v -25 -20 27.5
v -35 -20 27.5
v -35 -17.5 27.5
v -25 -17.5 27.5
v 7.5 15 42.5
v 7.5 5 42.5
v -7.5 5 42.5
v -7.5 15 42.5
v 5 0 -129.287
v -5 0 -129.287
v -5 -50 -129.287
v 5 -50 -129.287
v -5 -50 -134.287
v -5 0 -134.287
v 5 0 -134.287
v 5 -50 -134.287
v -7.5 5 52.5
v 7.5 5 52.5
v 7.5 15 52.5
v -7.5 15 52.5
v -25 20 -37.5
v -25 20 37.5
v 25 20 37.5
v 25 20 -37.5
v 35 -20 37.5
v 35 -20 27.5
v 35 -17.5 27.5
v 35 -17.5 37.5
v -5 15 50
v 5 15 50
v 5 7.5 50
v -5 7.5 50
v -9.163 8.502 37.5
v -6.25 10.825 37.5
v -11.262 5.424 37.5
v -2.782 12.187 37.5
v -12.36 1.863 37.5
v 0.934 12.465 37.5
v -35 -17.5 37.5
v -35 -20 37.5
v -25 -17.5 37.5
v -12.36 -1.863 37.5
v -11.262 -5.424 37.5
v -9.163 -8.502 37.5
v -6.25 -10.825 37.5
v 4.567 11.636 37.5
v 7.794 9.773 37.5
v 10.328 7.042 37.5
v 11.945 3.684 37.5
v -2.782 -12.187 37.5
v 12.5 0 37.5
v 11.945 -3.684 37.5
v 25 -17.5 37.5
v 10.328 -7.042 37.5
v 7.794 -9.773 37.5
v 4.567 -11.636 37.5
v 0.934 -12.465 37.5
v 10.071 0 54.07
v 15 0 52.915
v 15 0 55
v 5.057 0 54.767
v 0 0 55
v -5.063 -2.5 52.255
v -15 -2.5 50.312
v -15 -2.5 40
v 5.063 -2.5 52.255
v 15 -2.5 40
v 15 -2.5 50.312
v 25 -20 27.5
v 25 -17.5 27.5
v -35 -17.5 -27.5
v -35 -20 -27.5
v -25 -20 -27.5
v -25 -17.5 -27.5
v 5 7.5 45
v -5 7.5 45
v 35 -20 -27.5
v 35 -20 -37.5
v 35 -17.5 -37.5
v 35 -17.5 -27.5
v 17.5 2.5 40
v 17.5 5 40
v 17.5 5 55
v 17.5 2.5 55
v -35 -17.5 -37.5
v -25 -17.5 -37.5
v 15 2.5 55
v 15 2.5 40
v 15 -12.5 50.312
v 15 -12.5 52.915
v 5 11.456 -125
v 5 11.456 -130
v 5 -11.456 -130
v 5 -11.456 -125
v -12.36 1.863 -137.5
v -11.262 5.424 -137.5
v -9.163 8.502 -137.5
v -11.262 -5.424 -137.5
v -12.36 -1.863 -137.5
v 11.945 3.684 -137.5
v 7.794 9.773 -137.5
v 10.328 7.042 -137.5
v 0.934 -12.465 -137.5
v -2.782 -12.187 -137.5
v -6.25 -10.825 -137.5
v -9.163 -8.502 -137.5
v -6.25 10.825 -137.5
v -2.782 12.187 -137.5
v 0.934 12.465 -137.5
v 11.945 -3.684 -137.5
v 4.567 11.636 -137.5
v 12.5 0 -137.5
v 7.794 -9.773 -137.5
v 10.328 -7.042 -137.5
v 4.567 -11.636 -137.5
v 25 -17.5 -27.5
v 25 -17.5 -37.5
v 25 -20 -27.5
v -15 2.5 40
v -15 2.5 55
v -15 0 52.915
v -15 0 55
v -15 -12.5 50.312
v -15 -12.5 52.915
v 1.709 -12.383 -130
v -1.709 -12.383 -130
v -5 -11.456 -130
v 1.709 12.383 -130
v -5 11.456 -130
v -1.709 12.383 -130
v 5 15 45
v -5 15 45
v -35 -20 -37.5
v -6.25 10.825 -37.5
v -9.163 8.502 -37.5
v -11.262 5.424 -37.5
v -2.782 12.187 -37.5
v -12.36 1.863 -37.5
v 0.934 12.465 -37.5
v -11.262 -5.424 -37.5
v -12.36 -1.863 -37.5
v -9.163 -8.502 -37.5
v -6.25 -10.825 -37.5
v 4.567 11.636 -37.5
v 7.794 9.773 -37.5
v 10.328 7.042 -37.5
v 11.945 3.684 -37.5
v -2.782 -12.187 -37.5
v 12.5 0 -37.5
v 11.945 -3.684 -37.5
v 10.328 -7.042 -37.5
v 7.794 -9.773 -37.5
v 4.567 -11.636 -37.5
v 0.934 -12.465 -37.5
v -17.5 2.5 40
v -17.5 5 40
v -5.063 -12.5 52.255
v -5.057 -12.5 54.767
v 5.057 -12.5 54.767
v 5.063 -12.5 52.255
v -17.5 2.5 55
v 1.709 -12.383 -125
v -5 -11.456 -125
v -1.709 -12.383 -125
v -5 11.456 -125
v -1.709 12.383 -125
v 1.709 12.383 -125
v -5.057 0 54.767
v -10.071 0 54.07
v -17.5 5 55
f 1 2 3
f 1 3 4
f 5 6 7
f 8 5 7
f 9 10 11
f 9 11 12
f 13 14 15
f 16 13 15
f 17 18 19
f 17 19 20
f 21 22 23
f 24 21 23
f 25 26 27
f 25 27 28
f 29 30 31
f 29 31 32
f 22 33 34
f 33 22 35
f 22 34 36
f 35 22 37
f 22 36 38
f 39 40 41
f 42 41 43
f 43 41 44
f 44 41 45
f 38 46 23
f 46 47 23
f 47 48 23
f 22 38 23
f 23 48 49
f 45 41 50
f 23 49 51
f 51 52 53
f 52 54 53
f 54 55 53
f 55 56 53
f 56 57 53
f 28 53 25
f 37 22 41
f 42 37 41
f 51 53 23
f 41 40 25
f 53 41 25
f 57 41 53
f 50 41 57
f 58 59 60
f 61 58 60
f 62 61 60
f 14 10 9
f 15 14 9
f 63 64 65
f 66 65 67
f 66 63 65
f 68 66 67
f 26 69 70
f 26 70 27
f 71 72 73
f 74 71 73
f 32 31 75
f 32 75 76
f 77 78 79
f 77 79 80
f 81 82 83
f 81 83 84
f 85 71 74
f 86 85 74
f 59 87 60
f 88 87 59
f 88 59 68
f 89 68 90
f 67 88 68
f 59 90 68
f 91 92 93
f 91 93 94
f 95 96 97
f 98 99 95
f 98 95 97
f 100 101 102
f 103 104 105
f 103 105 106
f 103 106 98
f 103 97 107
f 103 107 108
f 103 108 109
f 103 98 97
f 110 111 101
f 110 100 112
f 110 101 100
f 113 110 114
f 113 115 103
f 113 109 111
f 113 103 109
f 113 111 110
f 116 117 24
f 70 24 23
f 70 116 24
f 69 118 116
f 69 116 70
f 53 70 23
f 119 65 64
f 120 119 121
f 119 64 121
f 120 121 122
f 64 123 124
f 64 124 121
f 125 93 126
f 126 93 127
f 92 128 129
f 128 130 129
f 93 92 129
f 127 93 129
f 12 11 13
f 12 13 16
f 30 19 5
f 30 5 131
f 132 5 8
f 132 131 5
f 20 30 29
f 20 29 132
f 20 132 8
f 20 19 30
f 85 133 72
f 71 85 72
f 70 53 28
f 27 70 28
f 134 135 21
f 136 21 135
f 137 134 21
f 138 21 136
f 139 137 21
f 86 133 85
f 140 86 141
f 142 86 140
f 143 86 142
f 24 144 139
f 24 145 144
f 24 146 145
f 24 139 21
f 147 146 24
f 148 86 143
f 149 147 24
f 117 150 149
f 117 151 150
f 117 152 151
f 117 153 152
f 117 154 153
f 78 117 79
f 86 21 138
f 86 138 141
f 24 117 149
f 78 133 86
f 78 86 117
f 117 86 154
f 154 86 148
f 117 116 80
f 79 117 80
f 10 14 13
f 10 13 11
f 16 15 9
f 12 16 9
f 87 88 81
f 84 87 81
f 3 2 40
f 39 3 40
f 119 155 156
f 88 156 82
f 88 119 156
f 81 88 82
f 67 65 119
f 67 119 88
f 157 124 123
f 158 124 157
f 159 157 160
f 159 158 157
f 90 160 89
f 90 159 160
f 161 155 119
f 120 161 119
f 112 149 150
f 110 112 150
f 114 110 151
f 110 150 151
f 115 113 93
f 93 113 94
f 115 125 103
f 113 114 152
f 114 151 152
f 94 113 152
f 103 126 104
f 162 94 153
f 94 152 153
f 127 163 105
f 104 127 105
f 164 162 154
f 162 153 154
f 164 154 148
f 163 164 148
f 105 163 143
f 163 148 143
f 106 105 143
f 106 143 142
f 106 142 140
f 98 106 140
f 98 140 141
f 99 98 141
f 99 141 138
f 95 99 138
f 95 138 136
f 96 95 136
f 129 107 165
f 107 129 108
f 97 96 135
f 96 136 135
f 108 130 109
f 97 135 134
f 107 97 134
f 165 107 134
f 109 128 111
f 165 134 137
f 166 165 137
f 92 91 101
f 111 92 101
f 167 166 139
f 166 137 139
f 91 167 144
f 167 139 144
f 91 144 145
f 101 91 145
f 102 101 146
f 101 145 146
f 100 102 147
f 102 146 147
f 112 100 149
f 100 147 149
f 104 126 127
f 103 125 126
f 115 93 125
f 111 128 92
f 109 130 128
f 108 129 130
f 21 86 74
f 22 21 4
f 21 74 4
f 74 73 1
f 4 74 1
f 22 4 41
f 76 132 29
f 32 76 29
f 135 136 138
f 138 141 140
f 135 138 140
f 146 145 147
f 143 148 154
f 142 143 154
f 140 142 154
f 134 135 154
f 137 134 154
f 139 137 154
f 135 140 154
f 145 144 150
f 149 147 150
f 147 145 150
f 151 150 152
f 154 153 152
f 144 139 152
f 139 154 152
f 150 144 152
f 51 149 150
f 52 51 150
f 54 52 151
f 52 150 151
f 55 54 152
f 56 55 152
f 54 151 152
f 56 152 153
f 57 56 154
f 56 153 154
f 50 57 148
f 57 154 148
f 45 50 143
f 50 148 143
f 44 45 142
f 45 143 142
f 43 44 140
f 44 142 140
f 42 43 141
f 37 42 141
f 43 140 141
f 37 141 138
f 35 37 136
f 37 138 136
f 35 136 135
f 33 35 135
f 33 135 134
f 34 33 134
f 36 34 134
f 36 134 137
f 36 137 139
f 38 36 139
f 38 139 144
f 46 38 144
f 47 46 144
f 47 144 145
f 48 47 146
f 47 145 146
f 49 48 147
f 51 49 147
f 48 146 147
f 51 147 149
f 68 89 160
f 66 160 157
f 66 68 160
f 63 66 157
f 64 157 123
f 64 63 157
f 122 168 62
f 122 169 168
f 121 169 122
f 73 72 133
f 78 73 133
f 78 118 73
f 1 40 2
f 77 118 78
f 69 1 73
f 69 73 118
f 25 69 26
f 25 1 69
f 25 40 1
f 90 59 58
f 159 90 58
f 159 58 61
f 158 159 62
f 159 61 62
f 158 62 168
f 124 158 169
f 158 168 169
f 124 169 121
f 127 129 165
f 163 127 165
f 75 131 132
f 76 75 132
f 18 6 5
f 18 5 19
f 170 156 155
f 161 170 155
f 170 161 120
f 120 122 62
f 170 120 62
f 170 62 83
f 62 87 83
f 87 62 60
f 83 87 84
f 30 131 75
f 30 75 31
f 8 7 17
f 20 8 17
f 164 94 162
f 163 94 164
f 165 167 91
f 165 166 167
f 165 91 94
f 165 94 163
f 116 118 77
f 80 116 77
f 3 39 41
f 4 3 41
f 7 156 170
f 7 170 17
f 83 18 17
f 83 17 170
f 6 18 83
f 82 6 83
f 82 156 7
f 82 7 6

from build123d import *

# Parameters (mm, degrees)
F0_R      = 55
F1_DEPTH  = 12.5
F2_T      = -2.5
F4_DEPTH  = 25
F5_W      = 2.5
F5_H      = 2.5
F6_DEPTH  = 15
F7_W      = 15
F7_H      = 10
F8_DEPTH  = 10
F9_W      = 10
F9_H      = 5
F10_DEPTH = 7.5
F11_W     = 50
F11_H     = 75
F12_DEPTH = 20
F13_R     = 12.5
F14_DEPTH = 75
F15_W     = 10
F15_H     = 10
F16_DEPTH = 2.5
F18_DEPTH = 100
F17_W     = 10
F17_H     = 5
F19_DEPTH = 40
F20_W     = 10
F20_H     = 5
F21_DEPTH = 50


with BuildPart() as f1:
    # F0 (on Front) → F1 (new body)
    with BuildSketch(Plane.XZ):
        Circle(F0_R)
    extrude(amount=F1_DEPTH)

    # F2
    f2_openings = [f1.faces().sort_by_distance(p)[0] for p in [
        (0, -12.5, 0),
    ]]
    offset(amount=F2_T, openings=f2_openings)

    # F3 (on face) → F4 (cut)
    with BuildSketch(Plane.XZ.offset(12.5)):
        with BuildLine():
            Line((-15, 40), (-15, 50.3115294937))
            ThreePointArc((-15, 50.3115294937), (-31.374750995, -42.0936456012), (52.5, 0))
            ThreePointArc((52.5, 0), (42.0936456012, 31.374750995), (15, 50.3115294937))
            Line((15, 50.3115294937), (15, 40))
            Line((15, 40), (-15, 40))
        make_face()
        with BuildLine():
            ThreePointArc((-15, 52.9150262213), (-43.8748219325, 33.1662479094), (-55, 1.48e-08))
            ThreePointArc((-55, 1.48e-08), (-38.8908729315, -38.8908729991), (1.104e-07, -55))
            ThreePointArc((1.104e-07, -55), (38.8908730043, -38.8908729262), (55, 0))
            ThreePointArc((55, 0), (43.874821937, 33.1662479036), (15, 52.9150262213))
            Line((15, 52.9150262213), (15, 50.3115294937))
            ThreePointArc((15, 50.3115294937), (42.0936456012, 31.374750995), (52.5, 0))
            ThreePointArc((52.5, 0), (-31.374750995, -42.0936456012), (-15, 50.3115294937))
            Line((-15, 50.3115294937), (-15, 52.9150262213))
        make_face()
    extrude(amount=-F4_DEPTH, mode=Mode.SUBTRACT)

    # F5 (on face) → F6 (join)
    with BuildSketch(Plane(origin=(0, 0, 40), x_dir=(1, 0, 0), z_dir=(0, 0, -1))):
        Polygon((15, 0), (-15, 0), (-15, -2.5), (-15, -5), (15, -5), (15, -2.5), align=None)
        with Locations((16.25, -3.75)):
            Rectangle(F5_W, F5_H)
        with Locations((-16.25, -3.75)):
            Rectangle(F5_W, F5_H)
    extrude(amount=-F6_DEPTH)

    # F7 (on face) → F8 (join)
    with BuildSketch(Plane(origin=(0, 5, 0), x_dir=(-1, 0, 0), z_dir=(0, 1, 0))):
        with Locations((0, 47.5)):
            Rectangle(F7_W, F7_H)
    extrude(amount=F8_DEPTH)

    # F9 (on face) → F10 (cut)
    with BuildSketch(Plane(origin=(0, 15, 0), x_dir=(-1, 0, 0), z_dir=(0, 1, 0))):
        with Locations((0, 47.5)):
            Rectangle(F9_W, F9_H)
    extrude(amount=-F10_DEPTH, mode=Mode.SUBTRACT)


with BuildPart() as f12:
    # F11 (on Front) → F12 (new body, symmetric)
    with BuildSketch(Plane.XZ):
        Rectangle(F11_W, F11_H)
    extrude(amount=F12_DEPTH, both=True)

    # F13 (on face) → F14 (cut)
    with BuildSketch(Plane(origin=(0, 0, -37.5), x_dir=(1, 0, 0), z_dir=(0, 0, -1))):
        Circle(F13_R)
    extrude(amount=-F14_DEPTH, mode=Mode.SUBTRACT)

    # F15 (on face) → F16 (join)
    with BuildSketch(Plane.XZ.offset(20)):
        with Locations((-30, 32.5)):
            Rectangle(F15_W, F15_H)
        with Locations((30, 32.5)):
            Rectangle(F15_W, F15_H)
        with Locations((-30, -32.5)):
            Rectangle(F15_W, F15_H)
        with Locations((30, -32.5)):
            Rectangle(F15_W, F15_H)
    extrude(amount=-F16_DEPTH)


with BuildPart() as f18:
    # F13 (on face) → F18 (new body)
    with BuildSketch(Plane(origin=(0, 0, -37.5), x_dir=(1, 0, 0), z_dir=(0, 0, -1))):
        Circle(F13_R)
    extrude(amount=F18_DEPTH)

    # F17 (on face) → F19 (cut)
    with BuildSketch(Plane(origin=(0, 20, 0), x_dir=(-1, 0, 0), z_dir=(0, 1, 0))):
        with Locations((0, -127.5)):
            Rectangle(F17_W, F17_H)
    extrude(amount=-F19_DEPTH, mode=Mode.SUBTRACT)


with BuildPart() as f21:
    # F20 (on Front) → F21 (new body)
    with BuildSketch(Plane.XZ):
        with Locations((0, -131.7869126797)):
            Rectangle(F20_W, F20_H)
    extrude(amount=F21_DEPTH)


solid = Compound([f1.part, f12.part, f18.part, f21.part])
